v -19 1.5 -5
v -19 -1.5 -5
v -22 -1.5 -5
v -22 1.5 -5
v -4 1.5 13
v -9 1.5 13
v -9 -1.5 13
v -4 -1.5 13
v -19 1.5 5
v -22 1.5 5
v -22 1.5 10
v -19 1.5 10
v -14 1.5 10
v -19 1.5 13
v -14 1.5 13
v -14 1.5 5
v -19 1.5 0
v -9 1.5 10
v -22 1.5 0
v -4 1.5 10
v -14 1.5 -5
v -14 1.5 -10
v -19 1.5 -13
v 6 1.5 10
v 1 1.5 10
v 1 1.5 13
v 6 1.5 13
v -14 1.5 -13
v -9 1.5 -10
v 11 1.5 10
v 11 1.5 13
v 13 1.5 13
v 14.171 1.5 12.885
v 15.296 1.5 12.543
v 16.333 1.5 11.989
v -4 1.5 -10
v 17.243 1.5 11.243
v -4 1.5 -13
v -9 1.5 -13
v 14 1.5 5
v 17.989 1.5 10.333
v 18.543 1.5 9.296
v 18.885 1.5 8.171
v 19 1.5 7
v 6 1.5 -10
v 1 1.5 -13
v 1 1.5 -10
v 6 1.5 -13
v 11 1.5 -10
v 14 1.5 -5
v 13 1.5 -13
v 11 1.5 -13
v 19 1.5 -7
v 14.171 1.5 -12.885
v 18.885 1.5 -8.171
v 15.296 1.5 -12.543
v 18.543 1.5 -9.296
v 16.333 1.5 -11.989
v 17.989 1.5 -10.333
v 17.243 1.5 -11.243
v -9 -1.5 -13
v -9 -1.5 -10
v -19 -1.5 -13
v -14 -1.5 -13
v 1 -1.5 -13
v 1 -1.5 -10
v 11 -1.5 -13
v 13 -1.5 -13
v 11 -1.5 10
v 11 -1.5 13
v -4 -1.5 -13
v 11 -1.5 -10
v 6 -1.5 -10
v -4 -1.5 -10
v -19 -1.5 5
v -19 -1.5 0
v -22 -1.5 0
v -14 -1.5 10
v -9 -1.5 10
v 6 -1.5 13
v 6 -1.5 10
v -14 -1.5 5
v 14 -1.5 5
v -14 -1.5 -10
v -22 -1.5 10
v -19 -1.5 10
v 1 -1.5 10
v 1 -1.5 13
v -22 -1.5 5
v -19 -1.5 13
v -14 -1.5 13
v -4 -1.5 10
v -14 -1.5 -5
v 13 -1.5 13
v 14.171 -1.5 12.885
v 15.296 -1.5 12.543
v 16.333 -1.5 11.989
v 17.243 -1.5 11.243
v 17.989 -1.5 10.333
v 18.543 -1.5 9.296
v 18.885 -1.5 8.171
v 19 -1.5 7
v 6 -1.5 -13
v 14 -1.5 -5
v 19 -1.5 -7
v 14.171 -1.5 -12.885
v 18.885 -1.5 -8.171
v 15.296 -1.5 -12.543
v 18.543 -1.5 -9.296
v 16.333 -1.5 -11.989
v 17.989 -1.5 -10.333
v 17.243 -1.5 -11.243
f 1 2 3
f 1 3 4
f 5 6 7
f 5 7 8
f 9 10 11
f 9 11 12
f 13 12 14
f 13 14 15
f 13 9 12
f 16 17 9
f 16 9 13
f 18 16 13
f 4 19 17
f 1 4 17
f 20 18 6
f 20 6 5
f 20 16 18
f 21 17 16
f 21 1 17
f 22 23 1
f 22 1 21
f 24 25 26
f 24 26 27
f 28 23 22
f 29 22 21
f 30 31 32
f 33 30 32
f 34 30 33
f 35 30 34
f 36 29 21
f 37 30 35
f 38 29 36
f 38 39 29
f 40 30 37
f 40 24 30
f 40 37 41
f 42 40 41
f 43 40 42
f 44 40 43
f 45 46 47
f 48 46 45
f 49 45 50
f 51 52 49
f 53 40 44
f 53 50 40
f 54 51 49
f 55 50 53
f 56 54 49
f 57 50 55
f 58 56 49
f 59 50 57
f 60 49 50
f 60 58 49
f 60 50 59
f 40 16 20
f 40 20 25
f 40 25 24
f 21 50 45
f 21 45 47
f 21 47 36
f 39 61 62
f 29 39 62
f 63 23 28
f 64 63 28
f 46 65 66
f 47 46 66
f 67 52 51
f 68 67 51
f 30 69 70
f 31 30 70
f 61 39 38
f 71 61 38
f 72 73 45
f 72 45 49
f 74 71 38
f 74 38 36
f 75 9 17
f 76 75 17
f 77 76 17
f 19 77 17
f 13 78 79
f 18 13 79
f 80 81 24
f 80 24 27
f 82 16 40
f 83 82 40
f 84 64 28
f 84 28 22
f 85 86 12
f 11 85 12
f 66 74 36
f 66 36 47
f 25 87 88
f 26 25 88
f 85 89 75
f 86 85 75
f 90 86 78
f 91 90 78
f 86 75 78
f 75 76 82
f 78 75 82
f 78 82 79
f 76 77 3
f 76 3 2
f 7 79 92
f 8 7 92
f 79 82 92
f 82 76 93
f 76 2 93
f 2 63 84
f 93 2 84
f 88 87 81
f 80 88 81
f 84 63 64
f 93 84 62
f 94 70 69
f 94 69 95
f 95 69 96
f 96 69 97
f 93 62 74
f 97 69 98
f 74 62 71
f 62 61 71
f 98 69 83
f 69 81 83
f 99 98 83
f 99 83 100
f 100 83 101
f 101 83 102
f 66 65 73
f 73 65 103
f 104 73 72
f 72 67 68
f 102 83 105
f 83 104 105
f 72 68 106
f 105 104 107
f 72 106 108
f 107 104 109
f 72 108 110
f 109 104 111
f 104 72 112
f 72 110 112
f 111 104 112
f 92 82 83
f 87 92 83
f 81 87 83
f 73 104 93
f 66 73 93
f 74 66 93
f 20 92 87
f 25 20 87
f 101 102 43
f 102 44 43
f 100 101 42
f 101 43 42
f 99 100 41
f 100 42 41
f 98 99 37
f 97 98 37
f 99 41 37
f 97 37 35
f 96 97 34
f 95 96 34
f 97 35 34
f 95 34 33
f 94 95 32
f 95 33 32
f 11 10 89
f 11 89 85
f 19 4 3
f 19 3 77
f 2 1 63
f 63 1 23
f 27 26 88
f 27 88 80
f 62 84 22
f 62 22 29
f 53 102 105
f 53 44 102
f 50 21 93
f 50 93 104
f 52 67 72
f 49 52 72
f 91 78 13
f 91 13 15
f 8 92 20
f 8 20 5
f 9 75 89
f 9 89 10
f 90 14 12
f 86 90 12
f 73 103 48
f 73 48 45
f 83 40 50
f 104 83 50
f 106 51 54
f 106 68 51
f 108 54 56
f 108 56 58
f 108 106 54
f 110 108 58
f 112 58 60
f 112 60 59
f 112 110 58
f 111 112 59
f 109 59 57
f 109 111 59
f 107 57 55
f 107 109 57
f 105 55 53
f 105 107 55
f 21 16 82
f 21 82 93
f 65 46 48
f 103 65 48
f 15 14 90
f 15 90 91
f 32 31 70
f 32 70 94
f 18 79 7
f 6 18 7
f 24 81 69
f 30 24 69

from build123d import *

# Parameters (mm, degrees)
SKETCH1_W           = 38
SKETCH1_H           = 26
BOSS_EXTRUDE1_DEPTH = 1.5
SKETCH8_W           = 5
SKETCH8_H           = 3
BOSS_EXTRUDE2_DEPTH = 3
SKETCH9_W           = 5
SKETCH9_H           = 3
CUT_EXTRUDE2_DEPTH  = 3
FILLET1_R           = 6
SKETCH10_W          = 28
SKETCH10_H          = 10
CUT_EXTRUDE3_DEPTH  = 3


with BuildPart() as part:
    # Sketch1 → Boss-Extrude1 (new body, symmetric)
    with BuildSketch(Plane(origin=(0, 0, 0), x_dir=(1, 0, 0), z_dir=(0, 1, 0))):
        Rectangle(SKETCH1_W, SKETCH1_H)
    extrude(amount=BOSS_EXTRUDE1_DEPTH, both=True)

    # Sketch8 → Boss-Extrude2 (add)
    with BuildSketch(Plane.ZY.offset(19)):
        with Locations((-2.5, 0)):
            Rectangle(SKETCH8_W, SKETCH8_H)
        with Locations((7.5, 0)):
            Rectangle(SKETCH8_W, SKETCH8_H)
    extrude(amount=BOSS_EXTRUDE2_DEPTH)

    # Sketch9 → Cut-Extrude2 (cut)
    with BuildSketch(Plane.XZ.offset(1.5)):
        with Locations((-11.5, -11.5)):
            Rectangle(SKETCH9_W, SKETCH9_H)
        with Locations((-11.5, 11.5)):
            Rectangle(SKETCH9_W, SKETCH9_H)
        with Locations((-1.5, -11.5)):
            Rectangle(SKETCH9_W, SKETCH9_H)
        with Locations((-1.5, 11.5)):
            Rectangle(SKETCH9_W, SKETCH9_H)
        with Locations((8.5, -11.5)):
            Rectangle(SKETCH9_W, SKETCH9_H)
        with Locations((8.5, 11.5)):
            Rectangle(SKETCH9_W, SKETCH9_H)
    extrude(amount=-CUT_EXTRUDE2_DEPTH, mode=Mode.SUBTRACT)

    # Fillet1
    fillet1_edges = [part.edges().sort_by_distance(p)[0] for p in [
        (19, 0, 13),
        (19, 0, -13),
    ]]
    fillet(fillet1_edges, radius=FILLET1_R)

    # Sketch10 → Cut-Extrude3 (cut)
    with BuildSketch(Plane(origin=(0, 1.5, 0), x_dir=(1, 0, 0), z_dir=(0, 1, 0))):
        Rectangle(SKETCH10_W, SKETCH10_H)
    extrude(amount=-CUT_EXTRUDE3_DEPTH, mode=Mode.SUBTRACT)


solid = part.part
